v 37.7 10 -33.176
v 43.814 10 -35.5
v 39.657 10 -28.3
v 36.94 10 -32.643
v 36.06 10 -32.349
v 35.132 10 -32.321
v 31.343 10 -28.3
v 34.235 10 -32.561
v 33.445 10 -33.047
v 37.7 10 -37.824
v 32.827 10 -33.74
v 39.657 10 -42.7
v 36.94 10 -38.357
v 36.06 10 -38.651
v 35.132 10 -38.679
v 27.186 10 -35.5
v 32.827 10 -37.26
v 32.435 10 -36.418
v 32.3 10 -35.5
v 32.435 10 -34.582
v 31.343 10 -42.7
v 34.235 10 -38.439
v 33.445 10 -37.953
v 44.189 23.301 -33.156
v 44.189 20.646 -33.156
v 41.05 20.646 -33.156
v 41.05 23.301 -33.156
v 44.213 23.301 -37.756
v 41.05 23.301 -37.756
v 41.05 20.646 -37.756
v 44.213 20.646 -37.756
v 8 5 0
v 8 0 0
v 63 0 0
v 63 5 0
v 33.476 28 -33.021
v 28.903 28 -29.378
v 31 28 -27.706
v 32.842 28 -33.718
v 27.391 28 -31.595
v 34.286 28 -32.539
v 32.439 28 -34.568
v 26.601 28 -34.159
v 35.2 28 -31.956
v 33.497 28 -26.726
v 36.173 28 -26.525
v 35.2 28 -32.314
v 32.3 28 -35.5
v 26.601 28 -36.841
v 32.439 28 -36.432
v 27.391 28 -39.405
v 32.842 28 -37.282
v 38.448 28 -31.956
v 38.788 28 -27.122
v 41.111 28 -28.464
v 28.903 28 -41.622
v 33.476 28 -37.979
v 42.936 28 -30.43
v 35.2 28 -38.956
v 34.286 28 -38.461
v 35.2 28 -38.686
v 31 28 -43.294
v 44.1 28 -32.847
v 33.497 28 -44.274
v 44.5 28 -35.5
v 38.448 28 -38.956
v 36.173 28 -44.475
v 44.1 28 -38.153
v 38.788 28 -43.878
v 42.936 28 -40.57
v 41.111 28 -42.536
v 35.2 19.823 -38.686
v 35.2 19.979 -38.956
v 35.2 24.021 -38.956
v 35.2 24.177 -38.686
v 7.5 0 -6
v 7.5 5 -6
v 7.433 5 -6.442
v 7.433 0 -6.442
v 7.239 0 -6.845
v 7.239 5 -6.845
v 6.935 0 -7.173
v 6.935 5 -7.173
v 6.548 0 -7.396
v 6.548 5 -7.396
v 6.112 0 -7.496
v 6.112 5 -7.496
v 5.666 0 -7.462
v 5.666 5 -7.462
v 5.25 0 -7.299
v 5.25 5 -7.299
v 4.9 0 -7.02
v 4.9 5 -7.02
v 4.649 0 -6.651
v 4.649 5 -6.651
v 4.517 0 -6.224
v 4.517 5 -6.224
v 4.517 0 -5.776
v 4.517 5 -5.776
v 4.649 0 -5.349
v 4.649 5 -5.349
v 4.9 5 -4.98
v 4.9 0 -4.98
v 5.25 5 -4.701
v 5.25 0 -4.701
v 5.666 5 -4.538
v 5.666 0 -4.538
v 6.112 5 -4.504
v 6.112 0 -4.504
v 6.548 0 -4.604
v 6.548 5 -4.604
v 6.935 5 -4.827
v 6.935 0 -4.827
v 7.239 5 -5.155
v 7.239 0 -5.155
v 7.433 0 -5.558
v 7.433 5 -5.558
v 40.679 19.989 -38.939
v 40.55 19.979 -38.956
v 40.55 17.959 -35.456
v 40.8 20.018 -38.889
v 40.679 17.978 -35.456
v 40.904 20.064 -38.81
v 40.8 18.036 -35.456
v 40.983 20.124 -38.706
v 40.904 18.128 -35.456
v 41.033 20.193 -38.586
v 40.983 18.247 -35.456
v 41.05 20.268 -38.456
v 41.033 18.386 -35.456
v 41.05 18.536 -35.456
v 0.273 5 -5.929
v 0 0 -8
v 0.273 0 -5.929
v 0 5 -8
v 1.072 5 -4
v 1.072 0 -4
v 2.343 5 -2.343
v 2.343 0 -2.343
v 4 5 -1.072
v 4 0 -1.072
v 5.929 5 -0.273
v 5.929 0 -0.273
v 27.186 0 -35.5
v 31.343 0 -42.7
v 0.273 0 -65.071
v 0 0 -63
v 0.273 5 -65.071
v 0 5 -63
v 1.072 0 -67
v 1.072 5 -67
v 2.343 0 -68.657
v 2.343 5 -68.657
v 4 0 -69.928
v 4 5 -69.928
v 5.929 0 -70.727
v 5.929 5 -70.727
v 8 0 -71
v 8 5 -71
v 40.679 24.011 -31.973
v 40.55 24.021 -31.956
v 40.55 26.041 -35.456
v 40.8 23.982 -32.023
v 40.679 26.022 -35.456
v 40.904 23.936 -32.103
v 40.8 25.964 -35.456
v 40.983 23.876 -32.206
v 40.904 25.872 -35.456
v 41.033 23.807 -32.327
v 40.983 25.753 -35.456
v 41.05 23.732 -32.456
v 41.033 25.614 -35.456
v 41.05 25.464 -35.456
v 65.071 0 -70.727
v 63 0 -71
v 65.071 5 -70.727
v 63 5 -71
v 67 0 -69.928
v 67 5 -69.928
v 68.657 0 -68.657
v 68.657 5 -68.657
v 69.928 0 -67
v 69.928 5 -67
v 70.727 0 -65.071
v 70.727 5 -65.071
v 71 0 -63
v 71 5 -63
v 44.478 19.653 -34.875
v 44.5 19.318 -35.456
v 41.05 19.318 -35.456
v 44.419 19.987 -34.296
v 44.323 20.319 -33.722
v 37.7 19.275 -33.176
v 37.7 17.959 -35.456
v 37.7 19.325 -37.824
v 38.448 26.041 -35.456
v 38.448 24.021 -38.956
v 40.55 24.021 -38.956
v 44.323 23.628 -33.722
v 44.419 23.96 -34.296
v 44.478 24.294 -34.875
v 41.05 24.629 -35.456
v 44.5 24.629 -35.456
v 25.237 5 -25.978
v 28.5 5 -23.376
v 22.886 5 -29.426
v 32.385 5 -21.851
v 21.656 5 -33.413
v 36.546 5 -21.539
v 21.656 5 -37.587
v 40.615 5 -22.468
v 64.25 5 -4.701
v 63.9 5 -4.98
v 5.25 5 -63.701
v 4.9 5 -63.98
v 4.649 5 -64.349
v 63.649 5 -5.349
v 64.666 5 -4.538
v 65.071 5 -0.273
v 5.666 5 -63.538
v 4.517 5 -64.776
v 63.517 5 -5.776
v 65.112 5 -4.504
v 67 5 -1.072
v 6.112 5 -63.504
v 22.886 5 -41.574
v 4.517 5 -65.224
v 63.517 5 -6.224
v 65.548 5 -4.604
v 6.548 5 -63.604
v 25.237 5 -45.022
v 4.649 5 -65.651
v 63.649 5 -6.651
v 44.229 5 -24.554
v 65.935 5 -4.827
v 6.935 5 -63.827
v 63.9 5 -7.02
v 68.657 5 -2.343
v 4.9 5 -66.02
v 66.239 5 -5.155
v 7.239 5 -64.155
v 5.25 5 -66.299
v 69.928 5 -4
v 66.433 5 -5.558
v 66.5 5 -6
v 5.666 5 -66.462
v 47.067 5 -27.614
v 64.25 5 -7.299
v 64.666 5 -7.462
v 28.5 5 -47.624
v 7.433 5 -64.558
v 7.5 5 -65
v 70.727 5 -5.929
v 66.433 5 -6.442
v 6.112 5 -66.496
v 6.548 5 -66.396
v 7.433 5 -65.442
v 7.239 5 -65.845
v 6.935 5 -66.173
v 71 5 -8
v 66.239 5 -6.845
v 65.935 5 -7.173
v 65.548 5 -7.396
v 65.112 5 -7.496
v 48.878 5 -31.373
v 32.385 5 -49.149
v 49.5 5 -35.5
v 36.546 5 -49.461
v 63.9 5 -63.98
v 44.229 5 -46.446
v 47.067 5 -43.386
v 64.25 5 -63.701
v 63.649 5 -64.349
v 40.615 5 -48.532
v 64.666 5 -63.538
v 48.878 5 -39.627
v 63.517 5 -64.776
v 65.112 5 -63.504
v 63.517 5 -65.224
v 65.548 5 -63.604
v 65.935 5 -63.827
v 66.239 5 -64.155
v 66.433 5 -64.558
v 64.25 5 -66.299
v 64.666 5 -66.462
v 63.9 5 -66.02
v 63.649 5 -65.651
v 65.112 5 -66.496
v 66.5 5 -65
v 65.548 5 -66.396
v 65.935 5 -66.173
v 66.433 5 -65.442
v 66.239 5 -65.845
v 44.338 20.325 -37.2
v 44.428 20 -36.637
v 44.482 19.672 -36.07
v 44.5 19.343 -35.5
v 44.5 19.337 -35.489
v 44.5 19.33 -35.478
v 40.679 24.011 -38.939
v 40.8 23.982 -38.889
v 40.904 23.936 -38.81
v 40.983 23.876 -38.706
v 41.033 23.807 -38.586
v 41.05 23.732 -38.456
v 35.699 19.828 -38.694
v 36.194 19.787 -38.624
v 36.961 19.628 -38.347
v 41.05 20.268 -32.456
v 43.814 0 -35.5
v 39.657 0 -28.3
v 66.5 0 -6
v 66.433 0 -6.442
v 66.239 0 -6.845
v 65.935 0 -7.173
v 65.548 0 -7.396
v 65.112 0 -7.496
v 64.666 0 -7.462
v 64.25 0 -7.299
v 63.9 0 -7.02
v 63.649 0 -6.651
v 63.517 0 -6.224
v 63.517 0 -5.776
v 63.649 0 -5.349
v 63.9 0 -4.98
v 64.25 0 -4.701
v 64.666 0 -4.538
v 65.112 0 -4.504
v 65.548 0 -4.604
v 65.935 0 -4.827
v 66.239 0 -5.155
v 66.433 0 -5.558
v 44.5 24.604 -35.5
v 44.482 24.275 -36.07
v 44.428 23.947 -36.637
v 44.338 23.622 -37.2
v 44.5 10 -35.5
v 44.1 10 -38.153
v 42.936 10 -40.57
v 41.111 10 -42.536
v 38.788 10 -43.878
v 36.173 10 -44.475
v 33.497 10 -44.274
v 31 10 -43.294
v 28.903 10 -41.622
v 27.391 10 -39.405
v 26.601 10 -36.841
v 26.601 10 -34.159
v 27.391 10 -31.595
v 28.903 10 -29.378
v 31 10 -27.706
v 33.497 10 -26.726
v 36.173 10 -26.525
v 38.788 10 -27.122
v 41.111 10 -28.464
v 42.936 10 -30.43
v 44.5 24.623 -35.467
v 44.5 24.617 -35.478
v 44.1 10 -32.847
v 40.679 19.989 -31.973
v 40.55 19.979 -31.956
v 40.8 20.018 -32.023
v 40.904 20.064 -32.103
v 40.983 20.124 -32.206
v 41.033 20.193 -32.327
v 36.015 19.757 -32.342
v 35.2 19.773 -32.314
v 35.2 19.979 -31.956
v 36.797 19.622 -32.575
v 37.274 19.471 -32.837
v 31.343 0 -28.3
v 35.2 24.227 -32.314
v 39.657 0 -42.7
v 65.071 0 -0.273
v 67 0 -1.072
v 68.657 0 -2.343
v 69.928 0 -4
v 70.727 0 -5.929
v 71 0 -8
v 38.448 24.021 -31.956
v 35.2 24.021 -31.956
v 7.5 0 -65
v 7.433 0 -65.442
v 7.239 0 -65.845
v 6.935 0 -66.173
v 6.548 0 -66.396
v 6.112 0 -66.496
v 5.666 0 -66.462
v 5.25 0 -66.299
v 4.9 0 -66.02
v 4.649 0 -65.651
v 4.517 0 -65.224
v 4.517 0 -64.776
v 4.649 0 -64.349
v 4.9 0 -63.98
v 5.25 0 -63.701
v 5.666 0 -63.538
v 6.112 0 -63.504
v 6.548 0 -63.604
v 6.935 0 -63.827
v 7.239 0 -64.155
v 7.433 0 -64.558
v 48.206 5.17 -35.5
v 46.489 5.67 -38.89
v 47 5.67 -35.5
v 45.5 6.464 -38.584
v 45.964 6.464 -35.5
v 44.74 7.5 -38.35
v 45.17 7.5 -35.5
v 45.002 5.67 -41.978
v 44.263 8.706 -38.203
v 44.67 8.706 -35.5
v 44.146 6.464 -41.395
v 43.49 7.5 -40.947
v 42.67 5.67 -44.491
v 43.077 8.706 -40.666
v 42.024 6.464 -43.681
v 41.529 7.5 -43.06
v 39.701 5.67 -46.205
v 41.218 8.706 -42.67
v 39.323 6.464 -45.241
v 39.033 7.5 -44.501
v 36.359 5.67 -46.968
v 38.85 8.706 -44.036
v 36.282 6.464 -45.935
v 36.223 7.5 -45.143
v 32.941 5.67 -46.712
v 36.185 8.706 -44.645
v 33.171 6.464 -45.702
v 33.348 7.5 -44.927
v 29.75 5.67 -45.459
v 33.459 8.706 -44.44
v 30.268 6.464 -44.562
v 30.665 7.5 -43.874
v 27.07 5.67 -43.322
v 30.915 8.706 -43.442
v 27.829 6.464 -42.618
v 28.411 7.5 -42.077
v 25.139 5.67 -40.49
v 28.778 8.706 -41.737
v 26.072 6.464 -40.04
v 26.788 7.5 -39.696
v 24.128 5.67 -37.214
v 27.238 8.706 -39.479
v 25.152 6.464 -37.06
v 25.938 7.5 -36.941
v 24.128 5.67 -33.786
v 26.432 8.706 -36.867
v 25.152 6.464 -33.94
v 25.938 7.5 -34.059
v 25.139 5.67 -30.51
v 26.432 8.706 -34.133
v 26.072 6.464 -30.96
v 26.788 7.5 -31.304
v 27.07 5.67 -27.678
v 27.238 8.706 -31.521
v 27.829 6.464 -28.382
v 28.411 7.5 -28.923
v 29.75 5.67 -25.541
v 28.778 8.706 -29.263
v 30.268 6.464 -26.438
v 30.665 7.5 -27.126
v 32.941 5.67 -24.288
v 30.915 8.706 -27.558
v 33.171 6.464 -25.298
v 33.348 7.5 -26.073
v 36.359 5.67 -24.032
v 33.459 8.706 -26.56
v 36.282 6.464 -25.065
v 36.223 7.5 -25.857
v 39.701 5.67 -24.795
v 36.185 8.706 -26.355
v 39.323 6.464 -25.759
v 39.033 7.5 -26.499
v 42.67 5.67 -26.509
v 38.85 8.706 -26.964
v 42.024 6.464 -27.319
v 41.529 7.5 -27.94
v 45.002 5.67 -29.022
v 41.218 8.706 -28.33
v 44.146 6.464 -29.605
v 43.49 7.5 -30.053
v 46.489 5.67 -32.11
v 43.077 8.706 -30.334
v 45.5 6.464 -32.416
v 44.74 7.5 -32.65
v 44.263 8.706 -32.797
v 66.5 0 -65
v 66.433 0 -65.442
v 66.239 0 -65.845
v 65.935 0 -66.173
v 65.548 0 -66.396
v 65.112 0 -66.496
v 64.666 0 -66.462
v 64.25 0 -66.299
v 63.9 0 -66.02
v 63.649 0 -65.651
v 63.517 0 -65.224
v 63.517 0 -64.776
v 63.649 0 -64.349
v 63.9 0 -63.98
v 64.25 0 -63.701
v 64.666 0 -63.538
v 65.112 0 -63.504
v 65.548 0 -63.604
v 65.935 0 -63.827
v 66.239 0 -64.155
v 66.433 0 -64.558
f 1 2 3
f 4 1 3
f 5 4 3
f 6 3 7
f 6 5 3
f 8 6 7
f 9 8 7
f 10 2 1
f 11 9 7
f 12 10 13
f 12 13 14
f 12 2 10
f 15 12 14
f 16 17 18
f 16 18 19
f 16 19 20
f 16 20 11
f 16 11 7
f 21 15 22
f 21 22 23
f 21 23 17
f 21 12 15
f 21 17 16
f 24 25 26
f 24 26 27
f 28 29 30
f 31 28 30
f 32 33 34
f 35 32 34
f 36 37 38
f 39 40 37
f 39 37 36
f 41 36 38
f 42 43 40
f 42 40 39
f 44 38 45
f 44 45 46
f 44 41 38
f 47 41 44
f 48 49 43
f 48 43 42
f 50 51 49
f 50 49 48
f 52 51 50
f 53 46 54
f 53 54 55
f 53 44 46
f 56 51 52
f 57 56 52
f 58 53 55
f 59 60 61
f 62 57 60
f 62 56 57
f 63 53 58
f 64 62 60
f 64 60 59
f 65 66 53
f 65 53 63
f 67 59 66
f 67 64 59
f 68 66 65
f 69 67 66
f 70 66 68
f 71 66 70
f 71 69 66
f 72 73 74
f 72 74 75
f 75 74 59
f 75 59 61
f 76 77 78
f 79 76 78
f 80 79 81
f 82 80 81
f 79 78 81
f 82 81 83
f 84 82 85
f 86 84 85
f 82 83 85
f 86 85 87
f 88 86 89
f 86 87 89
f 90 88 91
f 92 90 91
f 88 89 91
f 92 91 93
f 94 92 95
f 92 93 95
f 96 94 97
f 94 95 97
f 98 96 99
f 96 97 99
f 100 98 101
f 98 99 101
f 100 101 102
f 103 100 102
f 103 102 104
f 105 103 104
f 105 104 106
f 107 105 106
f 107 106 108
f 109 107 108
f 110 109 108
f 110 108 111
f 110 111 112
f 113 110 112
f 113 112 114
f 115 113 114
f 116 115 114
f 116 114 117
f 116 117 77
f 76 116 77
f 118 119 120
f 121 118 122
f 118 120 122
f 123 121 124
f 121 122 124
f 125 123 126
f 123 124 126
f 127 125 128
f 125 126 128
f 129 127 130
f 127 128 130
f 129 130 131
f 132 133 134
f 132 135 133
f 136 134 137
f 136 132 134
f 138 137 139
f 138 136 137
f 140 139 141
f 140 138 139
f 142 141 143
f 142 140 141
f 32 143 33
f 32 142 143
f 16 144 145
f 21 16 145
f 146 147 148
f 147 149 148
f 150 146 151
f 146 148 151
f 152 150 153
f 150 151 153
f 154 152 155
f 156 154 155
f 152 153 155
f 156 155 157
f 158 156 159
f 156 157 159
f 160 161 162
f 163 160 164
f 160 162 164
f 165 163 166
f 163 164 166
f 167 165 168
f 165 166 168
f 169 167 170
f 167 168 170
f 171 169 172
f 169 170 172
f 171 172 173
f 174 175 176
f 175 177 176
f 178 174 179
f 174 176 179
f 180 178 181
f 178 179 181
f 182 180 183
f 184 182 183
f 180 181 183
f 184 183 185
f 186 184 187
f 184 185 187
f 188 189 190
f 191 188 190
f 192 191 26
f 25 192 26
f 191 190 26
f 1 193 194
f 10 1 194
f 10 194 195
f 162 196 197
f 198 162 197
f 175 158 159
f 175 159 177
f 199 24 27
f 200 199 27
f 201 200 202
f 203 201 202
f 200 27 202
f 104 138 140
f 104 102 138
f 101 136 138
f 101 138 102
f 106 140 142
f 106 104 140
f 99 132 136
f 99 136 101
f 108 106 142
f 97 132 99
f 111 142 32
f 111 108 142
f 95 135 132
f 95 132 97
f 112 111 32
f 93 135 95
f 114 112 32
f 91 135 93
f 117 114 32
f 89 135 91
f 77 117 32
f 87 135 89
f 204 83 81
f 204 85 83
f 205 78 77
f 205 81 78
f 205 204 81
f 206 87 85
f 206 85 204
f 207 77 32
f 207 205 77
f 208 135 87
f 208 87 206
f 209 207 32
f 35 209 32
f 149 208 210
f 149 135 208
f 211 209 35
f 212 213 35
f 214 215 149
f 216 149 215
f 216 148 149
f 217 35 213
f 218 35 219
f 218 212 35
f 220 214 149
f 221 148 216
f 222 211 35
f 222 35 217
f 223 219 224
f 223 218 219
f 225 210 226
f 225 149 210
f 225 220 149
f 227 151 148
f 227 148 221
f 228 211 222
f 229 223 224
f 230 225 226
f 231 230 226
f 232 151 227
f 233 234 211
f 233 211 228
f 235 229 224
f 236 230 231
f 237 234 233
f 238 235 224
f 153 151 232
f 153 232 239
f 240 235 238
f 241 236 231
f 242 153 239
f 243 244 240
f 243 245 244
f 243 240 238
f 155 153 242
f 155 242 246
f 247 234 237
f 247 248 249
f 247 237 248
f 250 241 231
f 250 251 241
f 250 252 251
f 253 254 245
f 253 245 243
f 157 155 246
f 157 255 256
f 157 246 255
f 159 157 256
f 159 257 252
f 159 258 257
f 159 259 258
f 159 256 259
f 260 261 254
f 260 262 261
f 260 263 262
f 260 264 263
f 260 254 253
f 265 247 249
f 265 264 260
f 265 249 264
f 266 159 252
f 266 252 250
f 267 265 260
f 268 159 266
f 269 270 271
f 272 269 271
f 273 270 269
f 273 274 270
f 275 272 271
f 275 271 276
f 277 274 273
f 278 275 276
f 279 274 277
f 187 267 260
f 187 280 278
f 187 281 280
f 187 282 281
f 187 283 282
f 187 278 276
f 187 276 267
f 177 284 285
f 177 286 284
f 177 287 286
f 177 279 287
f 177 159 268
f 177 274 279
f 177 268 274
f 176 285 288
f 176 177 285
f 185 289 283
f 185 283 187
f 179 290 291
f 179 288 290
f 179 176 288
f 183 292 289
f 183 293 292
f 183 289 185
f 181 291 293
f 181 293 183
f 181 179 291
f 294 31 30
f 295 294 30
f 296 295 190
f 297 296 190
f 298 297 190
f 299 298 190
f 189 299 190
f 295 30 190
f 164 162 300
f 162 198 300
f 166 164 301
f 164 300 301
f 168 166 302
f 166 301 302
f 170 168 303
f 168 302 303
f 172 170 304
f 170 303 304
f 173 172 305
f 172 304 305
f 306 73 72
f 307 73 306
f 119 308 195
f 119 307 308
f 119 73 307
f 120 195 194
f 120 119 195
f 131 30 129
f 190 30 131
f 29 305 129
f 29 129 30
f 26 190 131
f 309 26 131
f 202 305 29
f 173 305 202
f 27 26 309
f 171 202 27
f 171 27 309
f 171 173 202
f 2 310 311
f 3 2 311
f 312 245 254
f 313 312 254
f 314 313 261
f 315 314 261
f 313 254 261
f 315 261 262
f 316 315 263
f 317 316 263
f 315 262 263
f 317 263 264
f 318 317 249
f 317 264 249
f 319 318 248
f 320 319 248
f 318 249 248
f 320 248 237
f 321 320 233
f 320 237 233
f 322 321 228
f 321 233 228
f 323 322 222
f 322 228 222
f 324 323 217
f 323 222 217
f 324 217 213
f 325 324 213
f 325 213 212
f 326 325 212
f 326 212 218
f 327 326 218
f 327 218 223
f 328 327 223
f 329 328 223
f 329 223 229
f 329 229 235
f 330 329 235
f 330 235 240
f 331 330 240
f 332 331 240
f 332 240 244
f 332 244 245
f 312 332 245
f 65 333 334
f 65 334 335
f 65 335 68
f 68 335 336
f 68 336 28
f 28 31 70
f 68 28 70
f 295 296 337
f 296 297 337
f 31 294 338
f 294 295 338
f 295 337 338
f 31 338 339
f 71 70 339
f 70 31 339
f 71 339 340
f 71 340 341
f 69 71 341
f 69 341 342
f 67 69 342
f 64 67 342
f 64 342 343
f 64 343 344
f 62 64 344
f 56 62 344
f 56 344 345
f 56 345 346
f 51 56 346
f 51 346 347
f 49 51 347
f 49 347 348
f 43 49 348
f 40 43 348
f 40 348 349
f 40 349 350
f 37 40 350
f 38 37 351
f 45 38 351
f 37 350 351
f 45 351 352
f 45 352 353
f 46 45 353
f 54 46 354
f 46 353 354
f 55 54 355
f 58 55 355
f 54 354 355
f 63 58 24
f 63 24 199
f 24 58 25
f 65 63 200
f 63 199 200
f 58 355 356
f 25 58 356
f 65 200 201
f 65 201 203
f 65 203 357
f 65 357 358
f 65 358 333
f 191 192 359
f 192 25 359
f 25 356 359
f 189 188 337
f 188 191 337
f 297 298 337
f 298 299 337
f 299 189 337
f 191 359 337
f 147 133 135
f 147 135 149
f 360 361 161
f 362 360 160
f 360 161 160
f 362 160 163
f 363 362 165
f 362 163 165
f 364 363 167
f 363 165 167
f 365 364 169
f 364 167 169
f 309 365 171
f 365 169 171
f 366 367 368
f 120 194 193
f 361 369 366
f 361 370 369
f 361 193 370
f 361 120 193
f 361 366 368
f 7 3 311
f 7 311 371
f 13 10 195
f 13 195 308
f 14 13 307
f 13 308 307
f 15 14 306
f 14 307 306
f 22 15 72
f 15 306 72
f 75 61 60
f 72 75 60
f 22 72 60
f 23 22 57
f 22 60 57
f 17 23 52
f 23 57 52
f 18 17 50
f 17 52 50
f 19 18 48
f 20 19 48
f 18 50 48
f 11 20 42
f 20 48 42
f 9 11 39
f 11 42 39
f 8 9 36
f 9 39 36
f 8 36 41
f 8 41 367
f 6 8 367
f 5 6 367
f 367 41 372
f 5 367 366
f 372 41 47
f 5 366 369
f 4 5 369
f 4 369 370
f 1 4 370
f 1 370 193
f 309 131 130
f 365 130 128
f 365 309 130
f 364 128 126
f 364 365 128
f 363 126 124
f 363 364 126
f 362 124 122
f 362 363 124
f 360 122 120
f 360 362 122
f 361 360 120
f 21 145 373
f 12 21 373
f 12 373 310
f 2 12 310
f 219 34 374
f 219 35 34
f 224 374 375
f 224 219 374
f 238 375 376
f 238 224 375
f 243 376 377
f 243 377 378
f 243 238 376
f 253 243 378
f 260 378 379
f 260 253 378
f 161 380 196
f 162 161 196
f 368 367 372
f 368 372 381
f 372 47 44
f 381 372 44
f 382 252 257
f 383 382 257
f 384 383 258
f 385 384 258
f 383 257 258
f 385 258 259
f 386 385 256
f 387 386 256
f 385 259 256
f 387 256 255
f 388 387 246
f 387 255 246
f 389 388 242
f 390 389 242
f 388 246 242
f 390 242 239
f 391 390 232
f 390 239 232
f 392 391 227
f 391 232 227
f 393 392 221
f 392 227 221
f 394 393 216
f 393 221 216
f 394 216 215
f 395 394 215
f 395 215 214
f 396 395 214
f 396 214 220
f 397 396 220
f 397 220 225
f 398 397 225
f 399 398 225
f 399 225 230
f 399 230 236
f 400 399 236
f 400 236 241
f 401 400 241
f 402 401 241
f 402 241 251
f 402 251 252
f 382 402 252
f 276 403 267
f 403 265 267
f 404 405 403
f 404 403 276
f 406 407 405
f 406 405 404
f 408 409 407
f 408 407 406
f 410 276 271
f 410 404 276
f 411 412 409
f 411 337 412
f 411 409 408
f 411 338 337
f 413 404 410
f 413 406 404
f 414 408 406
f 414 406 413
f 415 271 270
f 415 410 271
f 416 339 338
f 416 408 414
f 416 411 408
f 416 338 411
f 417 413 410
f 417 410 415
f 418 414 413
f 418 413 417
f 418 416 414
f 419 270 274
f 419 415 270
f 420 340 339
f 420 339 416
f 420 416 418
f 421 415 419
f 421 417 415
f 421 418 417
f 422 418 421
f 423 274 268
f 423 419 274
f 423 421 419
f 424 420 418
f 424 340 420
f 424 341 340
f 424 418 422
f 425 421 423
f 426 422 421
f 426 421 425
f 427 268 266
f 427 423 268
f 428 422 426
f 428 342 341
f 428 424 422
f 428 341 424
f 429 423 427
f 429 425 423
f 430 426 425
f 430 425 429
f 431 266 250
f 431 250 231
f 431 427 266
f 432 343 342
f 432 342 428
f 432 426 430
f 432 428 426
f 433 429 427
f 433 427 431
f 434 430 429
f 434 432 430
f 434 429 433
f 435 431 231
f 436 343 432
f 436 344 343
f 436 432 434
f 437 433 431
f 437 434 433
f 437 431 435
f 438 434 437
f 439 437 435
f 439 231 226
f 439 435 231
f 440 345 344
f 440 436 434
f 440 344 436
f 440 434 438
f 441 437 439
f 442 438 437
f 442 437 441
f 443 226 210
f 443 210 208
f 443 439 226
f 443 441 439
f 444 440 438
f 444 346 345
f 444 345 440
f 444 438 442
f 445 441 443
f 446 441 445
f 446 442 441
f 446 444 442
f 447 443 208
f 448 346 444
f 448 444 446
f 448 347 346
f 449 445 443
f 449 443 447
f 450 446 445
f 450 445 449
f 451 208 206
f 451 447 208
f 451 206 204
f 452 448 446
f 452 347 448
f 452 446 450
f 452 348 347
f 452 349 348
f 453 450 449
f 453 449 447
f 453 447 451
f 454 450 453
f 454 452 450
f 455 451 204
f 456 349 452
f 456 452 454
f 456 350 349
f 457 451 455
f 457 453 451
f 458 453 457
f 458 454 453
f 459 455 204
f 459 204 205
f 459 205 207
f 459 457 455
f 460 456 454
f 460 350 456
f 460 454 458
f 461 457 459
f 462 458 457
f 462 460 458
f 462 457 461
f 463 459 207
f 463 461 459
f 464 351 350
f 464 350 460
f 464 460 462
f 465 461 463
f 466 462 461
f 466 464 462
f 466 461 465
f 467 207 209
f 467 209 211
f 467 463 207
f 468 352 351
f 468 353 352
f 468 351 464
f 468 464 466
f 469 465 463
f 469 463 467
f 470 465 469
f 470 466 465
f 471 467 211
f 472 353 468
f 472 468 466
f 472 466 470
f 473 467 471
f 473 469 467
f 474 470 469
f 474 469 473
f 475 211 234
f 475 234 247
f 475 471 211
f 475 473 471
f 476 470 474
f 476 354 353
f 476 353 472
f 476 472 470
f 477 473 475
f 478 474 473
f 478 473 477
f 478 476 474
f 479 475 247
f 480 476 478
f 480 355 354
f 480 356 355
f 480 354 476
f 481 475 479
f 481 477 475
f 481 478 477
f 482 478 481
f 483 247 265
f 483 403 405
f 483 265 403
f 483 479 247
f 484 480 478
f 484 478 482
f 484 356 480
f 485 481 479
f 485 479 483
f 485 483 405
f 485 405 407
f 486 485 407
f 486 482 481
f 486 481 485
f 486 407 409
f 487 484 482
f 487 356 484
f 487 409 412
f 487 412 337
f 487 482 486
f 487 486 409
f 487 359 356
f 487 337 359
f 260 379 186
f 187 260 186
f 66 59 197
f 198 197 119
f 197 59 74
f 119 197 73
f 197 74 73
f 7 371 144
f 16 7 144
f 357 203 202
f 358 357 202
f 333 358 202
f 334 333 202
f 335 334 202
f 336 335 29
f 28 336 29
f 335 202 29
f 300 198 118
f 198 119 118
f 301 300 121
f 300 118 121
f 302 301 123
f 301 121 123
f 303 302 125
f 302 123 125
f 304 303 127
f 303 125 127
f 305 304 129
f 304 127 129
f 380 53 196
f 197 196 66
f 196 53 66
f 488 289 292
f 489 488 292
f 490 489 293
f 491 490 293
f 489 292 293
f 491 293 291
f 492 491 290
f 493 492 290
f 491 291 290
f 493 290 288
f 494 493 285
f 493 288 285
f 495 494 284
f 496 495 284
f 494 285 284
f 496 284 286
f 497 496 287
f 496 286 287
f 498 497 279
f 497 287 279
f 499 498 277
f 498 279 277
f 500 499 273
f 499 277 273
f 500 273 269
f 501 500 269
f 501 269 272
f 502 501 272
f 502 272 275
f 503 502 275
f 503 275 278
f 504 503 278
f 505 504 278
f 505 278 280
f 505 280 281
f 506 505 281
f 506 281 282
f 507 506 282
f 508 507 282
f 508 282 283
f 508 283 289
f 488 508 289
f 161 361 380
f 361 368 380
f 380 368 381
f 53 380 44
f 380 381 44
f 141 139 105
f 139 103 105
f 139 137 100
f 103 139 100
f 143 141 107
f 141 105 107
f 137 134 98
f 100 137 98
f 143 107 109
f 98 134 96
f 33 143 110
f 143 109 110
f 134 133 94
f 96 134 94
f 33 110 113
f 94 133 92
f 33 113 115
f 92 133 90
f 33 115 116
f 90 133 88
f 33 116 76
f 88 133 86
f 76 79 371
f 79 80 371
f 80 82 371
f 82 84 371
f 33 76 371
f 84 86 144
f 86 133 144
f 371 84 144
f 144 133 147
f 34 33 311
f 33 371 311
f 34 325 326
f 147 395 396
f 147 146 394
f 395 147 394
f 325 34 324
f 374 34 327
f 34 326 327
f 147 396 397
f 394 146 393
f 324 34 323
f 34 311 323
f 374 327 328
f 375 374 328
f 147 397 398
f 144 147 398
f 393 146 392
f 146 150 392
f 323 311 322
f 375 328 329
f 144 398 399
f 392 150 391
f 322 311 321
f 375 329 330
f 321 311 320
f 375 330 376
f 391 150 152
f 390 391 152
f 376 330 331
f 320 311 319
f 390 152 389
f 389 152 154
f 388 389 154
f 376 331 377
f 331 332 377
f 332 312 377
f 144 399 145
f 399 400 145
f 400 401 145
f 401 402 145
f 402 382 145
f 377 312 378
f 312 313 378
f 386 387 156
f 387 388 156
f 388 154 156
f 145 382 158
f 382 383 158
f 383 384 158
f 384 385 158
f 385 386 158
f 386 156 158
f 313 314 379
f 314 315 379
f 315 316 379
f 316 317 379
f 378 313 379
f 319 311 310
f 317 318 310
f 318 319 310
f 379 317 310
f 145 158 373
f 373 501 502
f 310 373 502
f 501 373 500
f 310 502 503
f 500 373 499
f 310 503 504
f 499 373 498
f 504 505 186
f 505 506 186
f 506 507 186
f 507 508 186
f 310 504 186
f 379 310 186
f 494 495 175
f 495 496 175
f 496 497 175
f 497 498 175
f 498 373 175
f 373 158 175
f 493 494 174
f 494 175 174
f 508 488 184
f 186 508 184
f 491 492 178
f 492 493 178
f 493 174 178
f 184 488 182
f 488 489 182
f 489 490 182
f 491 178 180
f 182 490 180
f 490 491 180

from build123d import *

# Parameters (mm, degrees)
SKETCH1_W               = 71
SKETCH1_H               = 71
BOSS_EXTRUDE1_DEPTH     = 5
SKETCH2_R               = 9
BOSS_EXTRUDE2_DEPTH     = 23
FILLET1_R               = 5
CUT_EXTRUDE1_DEPTH      = 46
FILLET2_R               = 8
SKETCH4_R               = 1.5
CUT_EXTRUDE2_DEPTH      = 6
CUT_EXTRUDE3_DEPTH      = 10
CUT_EXTRUDE4_DEPTH      = 2.5
CUT_EXTRUDE4_DEPTH_BACK = 3.35
FILLET3_R               = 0.5
CUT_EXTRUDE9_DEPTH      = 30.95
SKETCH11_W              = 3.248200577
SKETCH11_H              = 7
CUT_EXTRUDE10_DEPTH     = 5


with BuildPart() as part:
    # Sketch1 → Boss-Extrude1 (new body)
    with BuildSketch(Plane(origin=(0, 0, 0), x_dir=(1, 0, 0), z_dir=(0, 1, 0))):
        with Locations((35.5, 35.5)):
            Rectangle(SKETCH1_W, SKETCH1_H)
    extrude(amount=BOSS_EXTRUDE1_DEPTH)

    # Sketch2 → Boss-Extrude2 (add)
    with BuildSketch(Plane(origin=(0, 5, 0), x_dir=(1, 0, 0), z_dir=(0, 1, 0))):
        with Locations((35.5, 35.5)):
            Circle(SKETCH2_R)
    extrude(amount=BOSS_EXTRUDE2_DEPTH)

    # Fillet1
    fillet1_edges = [part.edges().sort_by_distance(p)[0] for p in [
        (26.5, 5, -35.5),
    ]]
    fillet(fillet1_edges, radius=FILLET1_R)

    # Sketch3 → Cut-Extrude1 (cut)
    with BuildSketch(Plane(origin=(0, 28, 0), x_dir=(1, 0, 0), z_dir=(0, 1, 0))):
        with BuildLine():
            Line((37.7, 33.176209992), (37.7, 37.823790008))
            ThreePointArc((37.7, 37.823790008), (32.3, 35.5), (37.7, 33.176209992))
        make_face()
    extrude(amount=-CUT_EXTRUDE1_DEPTH, mode=Mode.SUBTRACT)

    # Fillet2
    fillet2_edges = [part.edges().sort_by_distance(p)[0] for p in [
        (0, 2.5, -71),
        (71, 2.5, -71),
        (71, 2.5, 0),
        (0, 2.5, 0),
    ]]
    fillet(fillet2_edges, radius=FILLET2_R)

    # Sketch4 → Cut-Extrude2 (cut, through all)
    with BuildSketch(Plane(origin=(0, 5, 0), x_dir=(1, 0, 0), z_dir=(0, 1, 0))):
        with Locations((65, 65)):
            Circle(SKETCH4_R)
        with Locations((65, 6)):
            Circle(SKETCH4_R)
        with Locations((6, 6)):
            Circle(SKETCH4_R)
        with Locations((6, 65)):
            Circle(SKETCH4_R)
    extrude(amount=-CUT_EXTRUDE2_DEPTH, mode=Mode.SUBTRACT)

    # Sketch5 → Cut-Extrude3 (cut)
    with BuildSketch(Plane(origin=(0, 0, 0), x_dir=(-1, 0, 0), z_dir=(0, -1, 0))):
        Polygon((-43.813843876, 35.5), (-39.656921938, 28.3), (-31.343078062, 28.3), (-27.186156124, 35.5), (-31.343078062, 42.7), (-39.656921938, 42.7), align=None)
    extrude(amount=-CUT_EXTRUDE3_DEPTH, mode=Mode.SUBTRACT)

    # Sketch6 → Cut-Extrude4 (cut, two sides)
    with BuildSketch(Plane.ZY.offset(-37.7)) as cut_extrude4_sk:
        Polygon((-35.456209992, 26.041451884), (-38.956209992, 24.020725942), (-38.956209992, 19.979274058), (-35.456209992, 17.958548116), (-31.956209992, 19.979274058), (-31.956209992, 24.020725942), align=None)
    extrude(amount=CUT_EXTRUDE4_DEPTH, mode=Mode.SUBTRACT)
    extrude(cut_extrude4_sk.sketch, amount=-CUT_EXTRUDE4_DEPTH_BACK, mode=Mode.SUBTRACT)

    # Fillet3
    fillet3_edges = [part.edges().sort_by_distance(p)[0] for p in [
        (41.05, 25.031088913, -33.706209992),
        (41.05, 25.031088913, -37.206209992),
        (41.05, 22, -38.956209992),
        (41.05, 18.968911087, -37.206209992),
        (41.05, 18.968911087, -33.706209992),
        (41.05, 22, -31.956209992),
    ]]
    fillet(fillet3_edges, radius=FILLET3_R)

    # Sketch10 → Cut-Extrude9 (cut, through all)
    with BuildSketch(Plane.ZY.offset(-41.05)):
        Polygon((-35.456209992, 24.629291376), (-37.756209992, 23.301385757), (-37.756209992, 20.645574519), (-35.456209992, 19.3176689), (-33.156209992, 20.645574519), (-33.156209992, 23.301385757), align=None)
    extrude(amount=-CUT_EXTRUDE9_DEPTH, mode=Mode.SUBTRACT)

    # Sketch11 → Cut-Extrude10 (cut)
    with BuildSketch(Plane(origin=(0, 28, 0), x_dir=(1, 0, 0), z_dir=(0, 1, 0))):
        with Locations((36.824100289, 35.456209992)):
            Rectangle(SKETCH11_W, SKETCH11_H)
    extrude(amount=-CUT_EXTRUDE10_DEPTH, mode=Mode.SUBTRACT)


solid = part.part
